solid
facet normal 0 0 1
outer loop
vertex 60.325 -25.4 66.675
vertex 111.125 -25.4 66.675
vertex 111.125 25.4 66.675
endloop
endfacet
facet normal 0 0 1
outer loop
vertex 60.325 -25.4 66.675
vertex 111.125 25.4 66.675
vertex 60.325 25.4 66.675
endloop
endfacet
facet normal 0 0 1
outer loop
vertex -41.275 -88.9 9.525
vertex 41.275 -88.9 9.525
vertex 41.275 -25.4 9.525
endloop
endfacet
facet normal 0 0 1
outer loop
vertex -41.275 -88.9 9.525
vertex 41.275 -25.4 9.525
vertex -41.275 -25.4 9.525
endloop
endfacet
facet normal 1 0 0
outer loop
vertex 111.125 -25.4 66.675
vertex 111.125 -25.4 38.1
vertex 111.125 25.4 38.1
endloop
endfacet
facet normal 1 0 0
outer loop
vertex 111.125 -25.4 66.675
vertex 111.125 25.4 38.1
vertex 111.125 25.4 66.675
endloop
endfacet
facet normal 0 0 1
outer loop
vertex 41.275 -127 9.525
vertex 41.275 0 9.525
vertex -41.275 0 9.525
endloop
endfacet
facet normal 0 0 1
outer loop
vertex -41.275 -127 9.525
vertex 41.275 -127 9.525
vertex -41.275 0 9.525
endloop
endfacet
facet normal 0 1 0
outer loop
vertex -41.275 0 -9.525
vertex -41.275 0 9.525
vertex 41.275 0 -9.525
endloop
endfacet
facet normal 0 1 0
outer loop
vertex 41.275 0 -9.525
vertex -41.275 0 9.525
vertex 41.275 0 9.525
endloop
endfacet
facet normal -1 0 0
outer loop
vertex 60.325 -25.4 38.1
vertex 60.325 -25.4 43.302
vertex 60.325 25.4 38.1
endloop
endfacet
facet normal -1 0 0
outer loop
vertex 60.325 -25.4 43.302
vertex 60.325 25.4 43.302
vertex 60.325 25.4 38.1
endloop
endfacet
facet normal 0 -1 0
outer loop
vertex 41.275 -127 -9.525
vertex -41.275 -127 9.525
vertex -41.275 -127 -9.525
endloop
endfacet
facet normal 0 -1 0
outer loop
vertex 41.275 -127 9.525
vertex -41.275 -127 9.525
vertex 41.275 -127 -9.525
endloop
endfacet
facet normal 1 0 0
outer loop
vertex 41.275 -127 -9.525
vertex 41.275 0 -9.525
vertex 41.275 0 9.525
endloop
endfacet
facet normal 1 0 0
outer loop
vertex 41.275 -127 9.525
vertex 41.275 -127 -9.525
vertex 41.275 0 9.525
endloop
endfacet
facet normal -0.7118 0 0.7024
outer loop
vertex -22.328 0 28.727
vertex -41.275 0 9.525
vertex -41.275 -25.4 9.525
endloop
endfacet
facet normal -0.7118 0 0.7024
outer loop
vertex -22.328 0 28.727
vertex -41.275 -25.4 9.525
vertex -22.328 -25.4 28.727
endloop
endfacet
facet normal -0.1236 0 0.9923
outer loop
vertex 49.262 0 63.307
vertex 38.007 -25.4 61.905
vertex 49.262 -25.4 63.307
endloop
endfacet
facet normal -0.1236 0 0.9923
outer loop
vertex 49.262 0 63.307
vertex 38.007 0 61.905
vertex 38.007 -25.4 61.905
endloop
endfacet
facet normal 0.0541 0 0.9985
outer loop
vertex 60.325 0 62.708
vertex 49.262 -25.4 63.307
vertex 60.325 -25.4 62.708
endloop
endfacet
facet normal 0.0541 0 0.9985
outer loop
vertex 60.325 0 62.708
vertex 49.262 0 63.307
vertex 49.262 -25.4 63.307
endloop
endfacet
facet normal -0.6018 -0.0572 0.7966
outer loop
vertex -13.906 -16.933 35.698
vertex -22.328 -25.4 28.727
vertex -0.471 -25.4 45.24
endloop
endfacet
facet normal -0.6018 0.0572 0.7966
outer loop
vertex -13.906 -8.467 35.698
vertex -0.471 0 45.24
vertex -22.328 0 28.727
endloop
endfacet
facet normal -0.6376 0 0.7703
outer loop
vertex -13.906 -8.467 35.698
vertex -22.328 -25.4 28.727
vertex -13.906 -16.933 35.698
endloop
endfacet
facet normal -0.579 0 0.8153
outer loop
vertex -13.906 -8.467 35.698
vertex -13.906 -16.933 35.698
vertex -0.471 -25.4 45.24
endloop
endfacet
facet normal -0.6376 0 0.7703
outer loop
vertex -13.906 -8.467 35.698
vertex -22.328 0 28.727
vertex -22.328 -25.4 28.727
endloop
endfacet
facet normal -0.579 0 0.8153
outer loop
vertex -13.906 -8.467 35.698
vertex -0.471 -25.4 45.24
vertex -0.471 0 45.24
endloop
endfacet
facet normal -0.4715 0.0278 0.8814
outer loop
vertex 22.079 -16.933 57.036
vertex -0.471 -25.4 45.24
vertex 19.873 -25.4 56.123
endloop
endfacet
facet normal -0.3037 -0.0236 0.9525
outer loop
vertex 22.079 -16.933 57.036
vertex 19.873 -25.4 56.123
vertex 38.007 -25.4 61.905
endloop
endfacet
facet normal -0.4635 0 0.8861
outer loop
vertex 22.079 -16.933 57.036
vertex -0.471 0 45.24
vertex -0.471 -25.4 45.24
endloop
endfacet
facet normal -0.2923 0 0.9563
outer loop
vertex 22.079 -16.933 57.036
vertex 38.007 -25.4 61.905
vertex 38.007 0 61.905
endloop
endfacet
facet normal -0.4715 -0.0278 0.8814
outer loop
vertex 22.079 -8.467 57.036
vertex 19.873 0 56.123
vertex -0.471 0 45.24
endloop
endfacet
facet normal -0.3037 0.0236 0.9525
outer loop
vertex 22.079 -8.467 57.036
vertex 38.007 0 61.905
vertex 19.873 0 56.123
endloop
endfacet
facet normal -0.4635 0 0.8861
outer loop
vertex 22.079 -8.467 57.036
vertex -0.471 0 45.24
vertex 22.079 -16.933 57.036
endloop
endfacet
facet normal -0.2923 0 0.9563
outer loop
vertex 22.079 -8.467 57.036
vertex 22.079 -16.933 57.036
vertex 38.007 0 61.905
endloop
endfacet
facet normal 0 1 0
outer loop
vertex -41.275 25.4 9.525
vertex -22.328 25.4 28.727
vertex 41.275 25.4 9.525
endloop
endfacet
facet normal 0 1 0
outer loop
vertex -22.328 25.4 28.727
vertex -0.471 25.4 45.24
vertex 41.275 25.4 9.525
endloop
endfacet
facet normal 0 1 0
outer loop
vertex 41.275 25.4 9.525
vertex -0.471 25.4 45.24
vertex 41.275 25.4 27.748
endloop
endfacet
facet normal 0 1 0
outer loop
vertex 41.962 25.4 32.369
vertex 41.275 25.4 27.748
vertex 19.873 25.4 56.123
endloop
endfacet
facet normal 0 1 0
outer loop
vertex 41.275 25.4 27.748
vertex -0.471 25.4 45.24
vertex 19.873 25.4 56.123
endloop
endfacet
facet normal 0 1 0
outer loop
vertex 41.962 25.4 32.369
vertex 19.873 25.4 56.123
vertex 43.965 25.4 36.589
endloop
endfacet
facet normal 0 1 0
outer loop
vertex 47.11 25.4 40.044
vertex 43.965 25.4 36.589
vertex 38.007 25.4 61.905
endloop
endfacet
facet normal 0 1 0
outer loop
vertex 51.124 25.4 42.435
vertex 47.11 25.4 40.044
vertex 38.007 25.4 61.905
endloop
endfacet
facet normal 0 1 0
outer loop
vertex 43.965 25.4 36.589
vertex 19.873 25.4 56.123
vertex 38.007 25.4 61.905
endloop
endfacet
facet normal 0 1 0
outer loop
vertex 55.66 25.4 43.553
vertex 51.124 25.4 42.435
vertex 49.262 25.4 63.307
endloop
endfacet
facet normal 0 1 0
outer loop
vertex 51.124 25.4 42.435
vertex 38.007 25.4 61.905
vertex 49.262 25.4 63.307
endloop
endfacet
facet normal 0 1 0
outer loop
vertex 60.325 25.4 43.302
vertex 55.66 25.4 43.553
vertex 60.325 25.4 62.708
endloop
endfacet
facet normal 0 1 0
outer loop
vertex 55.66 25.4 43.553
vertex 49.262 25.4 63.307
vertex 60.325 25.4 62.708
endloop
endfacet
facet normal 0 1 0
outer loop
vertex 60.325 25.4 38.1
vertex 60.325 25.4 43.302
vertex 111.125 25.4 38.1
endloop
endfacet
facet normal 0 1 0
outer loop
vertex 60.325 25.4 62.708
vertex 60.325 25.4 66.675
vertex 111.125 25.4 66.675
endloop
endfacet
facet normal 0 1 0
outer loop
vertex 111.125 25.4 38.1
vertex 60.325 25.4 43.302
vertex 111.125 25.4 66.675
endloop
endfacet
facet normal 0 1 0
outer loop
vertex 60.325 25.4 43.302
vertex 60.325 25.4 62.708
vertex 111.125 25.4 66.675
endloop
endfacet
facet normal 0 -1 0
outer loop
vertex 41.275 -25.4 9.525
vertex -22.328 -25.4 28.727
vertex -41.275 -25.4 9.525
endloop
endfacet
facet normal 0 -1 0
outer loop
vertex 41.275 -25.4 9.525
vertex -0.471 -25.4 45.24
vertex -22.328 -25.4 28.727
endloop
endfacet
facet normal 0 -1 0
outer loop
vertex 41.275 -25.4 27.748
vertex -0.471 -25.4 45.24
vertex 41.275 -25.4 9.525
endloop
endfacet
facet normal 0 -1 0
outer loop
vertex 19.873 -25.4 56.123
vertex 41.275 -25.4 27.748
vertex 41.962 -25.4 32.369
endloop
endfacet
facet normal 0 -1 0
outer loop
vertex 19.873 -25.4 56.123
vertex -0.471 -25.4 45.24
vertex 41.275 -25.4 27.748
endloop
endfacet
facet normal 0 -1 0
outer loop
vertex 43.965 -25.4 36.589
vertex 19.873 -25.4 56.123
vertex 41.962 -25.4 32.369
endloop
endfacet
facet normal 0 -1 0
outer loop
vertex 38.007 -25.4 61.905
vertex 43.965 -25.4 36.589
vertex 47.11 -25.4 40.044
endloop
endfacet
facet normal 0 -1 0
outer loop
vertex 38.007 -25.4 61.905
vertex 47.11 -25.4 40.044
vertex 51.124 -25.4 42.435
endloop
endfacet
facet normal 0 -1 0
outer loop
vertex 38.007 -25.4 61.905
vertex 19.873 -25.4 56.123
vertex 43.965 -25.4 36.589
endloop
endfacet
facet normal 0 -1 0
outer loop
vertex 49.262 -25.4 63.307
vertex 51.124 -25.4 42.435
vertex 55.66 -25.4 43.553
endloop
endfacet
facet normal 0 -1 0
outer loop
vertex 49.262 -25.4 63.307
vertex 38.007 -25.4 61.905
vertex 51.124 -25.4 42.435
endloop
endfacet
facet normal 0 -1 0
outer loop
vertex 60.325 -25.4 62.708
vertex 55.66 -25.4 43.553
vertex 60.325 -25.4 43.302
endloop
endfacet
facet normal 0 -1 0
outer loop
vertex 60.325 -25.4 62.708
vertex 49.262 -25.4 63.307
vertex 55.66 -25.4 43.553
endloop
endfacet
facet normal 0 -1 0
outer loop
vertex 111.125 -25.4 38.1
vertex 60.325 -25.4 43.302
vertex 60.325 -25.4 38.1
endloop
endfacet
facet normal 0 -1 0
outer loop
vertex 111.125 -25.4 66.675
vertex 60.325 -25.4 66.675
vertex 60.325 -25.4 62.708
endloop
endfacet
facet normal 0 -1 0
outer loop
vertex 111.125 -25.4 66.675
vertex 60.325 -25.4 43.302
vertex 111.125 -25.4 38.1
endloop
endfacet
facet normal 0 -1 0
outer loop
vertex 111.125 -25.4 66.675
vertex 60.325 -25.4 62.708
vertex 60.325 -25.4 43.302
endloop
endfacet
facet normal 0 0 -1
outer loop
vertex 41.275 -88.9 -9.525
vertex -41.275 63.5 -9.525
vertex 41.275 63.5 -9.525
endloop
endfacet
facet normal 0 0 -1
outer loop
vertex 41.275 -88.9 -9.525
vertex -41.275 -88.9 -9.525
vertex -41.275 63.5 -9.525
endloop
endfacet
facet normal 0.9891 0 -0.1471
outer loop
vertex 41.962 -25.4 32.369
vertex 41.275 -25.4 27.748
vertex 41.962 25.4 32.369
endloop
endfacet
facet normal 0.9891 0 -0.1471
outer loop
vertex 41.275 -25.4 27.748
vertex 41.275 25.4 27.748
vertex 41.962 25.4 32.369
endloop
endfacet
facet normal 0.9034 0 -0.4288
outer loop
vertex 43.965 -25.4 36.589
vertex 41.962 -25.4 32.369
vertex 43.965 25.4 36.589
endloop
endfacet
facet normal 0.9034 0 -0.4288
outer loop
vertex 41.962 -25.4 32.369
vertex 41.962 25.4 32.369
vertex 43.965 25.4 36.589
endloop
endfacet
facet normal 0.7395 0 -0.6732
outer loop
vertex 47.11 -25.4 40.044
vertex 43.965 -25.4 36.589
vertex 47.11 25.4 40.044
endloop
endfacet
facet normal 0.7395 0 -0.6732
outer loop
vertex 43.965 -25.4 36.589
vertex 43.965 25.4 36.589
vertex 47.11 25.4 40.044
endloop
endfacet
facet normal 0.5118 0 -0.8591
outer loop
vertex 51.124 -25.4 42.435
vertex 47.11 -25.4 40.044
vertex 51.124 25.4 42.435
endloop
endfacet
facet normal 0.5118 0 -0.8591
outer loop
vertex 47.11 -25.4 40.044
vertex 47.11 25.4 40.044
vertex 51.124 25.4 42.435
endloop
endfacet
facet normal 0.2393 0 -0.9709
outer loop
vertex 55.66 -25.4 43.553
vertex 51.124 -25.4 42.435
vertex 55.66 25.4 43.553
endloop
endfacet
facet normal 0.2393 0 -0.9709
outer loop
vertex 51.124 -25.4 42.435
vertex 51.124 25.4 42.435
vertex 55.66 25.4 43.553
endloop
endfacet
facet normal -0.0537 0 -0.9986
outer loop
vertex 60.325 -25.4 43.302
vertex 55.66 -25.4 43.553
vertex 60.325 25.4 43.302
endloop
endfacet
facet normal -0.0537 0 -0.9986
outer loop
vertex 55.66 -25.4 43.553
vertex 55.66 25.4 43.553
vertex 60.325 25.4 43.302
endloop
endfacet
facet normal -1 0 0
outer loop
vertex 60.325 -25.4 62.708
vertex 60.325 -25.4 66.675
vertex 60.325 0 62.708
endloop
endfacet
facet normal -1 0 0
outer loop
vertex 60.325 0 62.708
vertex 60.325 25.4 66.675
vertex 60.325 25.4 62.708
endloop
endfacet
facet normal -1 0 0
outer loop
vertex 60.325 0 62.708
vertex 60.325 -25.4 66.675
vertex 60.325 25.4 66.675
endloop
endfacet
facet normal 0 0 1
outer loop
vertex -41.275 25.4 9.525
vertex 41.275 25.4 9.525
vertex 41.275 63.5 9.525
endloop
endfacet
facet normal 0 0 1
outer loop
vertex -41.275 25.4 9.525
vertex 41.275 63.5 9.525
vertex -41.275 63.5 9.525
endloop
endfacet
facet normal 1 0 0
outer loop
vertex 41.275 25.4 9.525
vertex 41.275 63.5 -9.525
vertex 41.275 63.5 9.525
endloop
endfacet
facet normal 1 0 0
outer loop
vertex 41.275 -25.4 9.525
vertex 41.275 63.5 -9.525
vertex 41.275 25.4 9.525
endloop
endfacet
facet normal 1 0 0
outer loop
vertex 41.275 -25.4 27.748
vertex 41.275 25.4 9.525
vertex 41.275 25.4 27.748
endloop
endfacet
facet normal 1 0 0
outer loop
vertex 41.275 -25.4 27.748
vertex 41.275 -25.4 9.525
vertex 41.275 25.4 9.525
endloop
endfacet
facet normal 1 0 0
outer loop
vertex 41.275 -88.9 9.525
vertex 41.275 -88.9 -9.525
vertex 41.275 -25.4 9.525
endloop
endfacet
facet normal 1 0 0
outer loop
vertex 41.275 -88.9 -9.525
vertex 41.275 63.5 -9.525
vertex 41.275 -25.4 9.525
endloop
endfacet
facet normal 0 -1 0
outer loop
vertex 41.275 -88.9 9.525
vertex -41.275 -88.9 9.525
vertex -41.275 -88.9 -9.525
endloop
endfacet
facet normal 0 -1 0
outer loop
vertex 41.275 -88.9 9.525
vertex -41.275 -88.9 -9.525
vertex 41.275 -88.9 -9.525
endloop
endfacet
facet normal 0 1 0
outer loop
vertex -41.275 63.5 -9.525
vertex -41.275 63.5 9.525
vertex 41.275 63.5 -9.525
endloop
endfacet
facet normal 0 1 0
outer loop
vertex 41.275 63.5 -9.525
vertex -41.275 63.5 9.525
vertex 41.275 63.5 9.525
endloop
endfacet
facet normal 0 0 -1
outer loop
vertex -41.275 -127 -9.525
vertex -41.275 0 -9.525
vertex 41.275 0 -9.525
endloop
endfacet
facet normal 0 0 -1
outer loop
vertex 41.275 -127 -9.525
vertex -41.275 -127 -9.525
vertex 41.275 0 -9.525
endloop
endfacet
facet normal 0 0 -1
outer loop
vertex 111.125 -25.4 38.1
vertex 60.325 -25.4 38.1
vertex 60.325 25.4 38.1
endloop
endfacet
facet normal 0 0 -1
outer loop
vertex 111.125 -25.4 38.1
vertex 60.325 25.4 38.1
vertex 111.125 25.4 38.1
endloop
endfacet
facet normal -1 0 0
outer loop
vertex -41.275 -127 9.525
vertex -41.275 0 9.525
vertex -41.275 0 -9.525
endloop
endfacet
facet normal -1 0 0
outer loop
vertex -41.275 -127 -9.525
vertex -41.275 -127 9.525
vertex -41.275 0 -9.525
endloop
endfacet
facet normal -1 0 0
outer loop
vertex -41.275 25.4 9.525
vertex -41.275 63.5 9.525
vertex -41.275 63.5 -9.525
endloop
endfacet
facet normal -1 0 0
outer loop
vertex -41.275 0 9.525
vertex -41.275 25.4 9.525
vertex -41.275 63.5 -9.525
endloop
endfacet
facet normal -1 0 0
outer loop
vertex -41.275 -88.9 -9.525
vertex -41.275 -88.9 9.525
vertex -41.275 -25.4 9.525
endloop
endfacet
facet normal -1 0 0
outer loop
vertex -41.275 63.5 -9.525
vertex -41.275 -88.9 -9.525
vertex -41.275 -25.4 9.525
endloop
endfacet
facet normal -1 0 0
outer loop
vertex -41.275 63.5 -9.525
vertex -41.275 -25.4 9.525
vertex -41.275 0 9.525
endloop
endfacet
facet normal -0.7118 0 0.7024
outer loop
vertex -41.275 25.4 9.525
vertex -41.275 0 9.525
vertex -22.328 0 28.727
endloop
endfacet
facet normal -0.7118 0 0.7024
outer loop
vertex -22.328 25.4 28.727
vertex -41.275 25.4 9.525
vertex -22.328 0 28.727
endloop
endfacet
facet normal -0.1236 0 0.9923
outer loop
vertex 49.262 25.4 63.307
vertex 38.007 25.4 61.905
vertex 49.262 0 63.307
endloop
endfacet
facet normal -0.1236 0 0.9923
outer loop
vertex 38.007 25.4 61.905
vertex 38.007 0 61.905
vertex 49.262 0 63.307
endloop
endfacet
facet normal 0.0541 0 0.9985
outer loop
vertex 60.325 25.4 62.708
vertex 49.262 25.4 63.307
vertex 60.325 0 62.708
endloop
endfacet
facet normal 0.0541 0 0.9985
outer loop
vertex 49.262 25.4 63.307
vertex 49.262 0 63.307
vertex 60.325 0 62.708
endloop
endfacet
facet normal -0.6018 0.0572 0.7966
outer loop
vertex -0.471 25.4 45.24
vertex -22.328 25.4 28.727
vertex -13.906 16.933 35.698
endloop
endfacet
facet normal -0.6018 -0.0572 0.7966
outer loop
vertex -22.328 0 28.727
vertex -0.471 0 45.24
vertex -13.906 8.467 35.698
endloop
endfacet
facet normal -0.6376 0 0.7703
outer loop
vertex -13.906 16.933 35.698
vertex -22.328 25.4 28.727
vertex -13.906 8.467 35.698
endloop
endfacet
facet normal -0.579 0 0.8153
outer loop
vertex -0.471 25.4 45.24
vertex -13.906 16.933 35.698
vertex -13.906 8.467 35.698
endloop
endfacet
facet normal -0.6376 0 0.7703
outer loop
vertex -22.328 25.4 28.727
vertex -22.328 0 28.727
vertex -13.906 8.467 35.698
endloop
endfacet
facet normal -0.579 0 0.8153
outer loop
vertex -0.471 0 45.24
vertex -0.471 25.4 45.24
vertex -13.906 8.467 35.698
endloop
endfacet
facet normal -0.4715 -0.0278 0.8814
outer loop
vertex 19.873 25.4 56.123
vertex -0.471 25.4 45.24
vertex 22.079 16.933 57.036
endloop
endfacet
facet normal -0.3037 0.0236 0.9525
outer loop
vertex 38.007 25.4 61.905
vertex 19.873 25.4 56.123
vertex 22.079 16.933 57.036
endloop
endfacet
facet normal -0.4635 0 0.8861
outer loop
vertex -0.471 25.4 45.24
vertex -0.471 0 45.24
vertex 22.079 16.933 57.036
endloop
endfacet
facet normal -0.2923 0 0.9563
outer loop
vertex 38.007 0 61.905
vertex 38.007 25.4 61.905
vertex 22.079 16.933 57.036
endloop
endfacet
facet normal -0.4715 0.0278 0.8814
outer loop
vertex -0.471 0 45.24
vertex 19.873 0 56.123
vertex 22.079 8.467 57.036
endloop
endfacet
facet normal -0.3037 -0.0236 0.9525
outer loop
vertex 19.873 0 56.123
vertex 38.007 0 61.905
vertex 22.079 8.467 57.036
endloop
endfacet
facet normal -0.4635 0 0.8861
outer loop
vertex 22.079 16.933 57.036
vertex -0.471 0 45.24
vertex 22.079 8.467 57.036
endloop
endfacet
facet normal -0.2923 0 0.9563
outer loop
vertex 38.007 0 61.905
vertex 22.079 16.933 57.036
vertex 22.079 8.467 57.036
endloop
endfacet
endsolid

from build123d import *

# Parameters (mm, degrees)
F1_DEPTH  = 63.5
F1_FACE_W = 82.55
F1_FACE_H = 19.05
F2_DEPTH  = 25.4
F3_DEPTH  = 127


with BuildPart() as f1:
    # F0 (on Front) → F1 (new body, symmetric)
    with BuildSketch(Plane.XZ):
        Polygon((41.275, -9.525), (41.275, 9.525), (22.225, 9.525), (-41.275, 9.525), (-41.275, -9.525), align=None)
    extrude(amount=F1_DEPTH, both=True)

    # F0 (on Front) + F1_face (on face) → F2 (join, symmetric)
    with BuildSketch(Plane.XZ):
        Polygon((41.275, -9.525), (41.275, 9.525), (22.225, 9.525), (-41.275, 9.525), (-41.275, -9.525), align=None)
        with BuildLine():
            Line((22.225, 9.525), (41.275, 9.525))
            Line((41.275, 9.525), (41.275, 27.7477587237))
            ThreePointArc((41.275, 27.7477587237), (47.109768429, 40.0444808479), (60.325, 43.3020185904))
            Line((60.325, 43.3020185904), (60.325, 62.5281411253))
            ThreePointArc((60.325, 62.5281411253), (33.6035698035, 53.5415806584), (22.225, 27.7477587237))
            Line((22.225, 27.7477587237), (22.225, 9.525))
        make_face()
        with BuildLine():
            Line((-41.275, 9.525), (22.225, 9.525))
            Line((22.225, 9.525), (22.225, 27.7477587237))
            ThreePointArc((22.225, 27.7477587237), (33.6035698035, 53.5415806584), (60.325, 62.5281411253))
            Line((60.325, 62.5281411253), (60.325, 62.7084151164))
            add(Edge.make_bspline(
                [(-41.275, 9.525), (-20.3309781441, 34.5043759714), (23.0659828176, 68.4787866604), (60.325, 62.7084151164)],
                knots=[0, 0, 0, 0, 113.7868711882, 113.7868711882, 113.7868711882, 113.7868711882], degree=3))
        make_face()
        with BuildLine():
            ThreePointArc((61.9641609272, 42.8752), (61.1502770663, 43.1104866193), (60.325, 43.3020185904))
            Line((60.325, 43.3020185904), (60.325, 38.1))
            Line((60.325, 38.1), (111.125, 38.1))
            Line((111.125, 38.1), (111.125, 66.675))
            Line((111.125, 66.675), (60.325, 66.675))
            Line((60.325, 66.675), (60.325, 62.7084151164))
            add(Edge.make_bspline(
                [(60.325, 62.7084151164), (61.6709115762, 62.4999713504), (63.0088138781, 62.2396654496), (64.3373592373, 61.9252)],
                knots=[113.7868711882, 113.7868711882, 113.7868711882, 113.7868711882, 117.8972068529, 117.8972068529, 117.8972068529, 117.8972068529], degree=3))
            Line((64.3373592373, 61.9252), (85.725, 61.9252))
            Line((85.725, 61.9252), (85.725, 42.8752))
            Line((85.725, 42.8752), (61.9641609272, 42.8752))
        make_face()
        with BuildLine():
            Line((60.325, 62.5281411253), (60.325, 43.3020185904))
            ThreePointArc((60.325, 43.3020185904), (61.1502770663, 43.1104866193), (61.9641609272, 42.8752))
            Line((61.9641609272, 42.8752), (85.725, 42.8752))
            Line((85.725, 42.8752), (85.725, 61.9252))
            Line((85.725, 61.9252), (64.3373592373, 61.9252))
            ThreePointArc((64.3373592373, 61.9252), (62.3399428456, 62.2849867286), (60.325, 62.5281411253))
        make_face()
        with BuildLine():
            add(Edge.make_bspline(
                [(60.325, 62.7084151164), (61.6709115762, 62.4999713504), (63.0088138781, 62.2396654496), (64.3373592373, 61.9252)],
                knots=[113.7868711882, 113.7868711882, 113.7868711882, 113.7868711882, 117.8972068529, 117.8972068529, 117.8972068529, 117.8972068529], degree=3))
            Line((60.325, 62.7084151164), (60.325, 62.5281411253))
            ThreePointArc((60.325, 62.5281411253), (62.3399428456, 62.2849867286), (64.3373592373, 61.9252))
        make_face()
    with BuildSketch(Plane.XZ.offset(63.5)):
        Rectangle(F1_FACE_W, F1_FACE_H)
    extrude(amount=F2_DEPTH, both=True)


with BuildPart() as f3:
    # F0 (on Front) → F3 (new body)
    with BuildSketch(Plane.XZ):
        Polygon((41.275, -9.525), (41.275, 9.525), (22.225, 9.525), (-41.275, 9.525), (-41.275, -9.525), align=None)
    extrude(amount=F3_DEPTH)


solid = Compound([f1.part, f3.part])
